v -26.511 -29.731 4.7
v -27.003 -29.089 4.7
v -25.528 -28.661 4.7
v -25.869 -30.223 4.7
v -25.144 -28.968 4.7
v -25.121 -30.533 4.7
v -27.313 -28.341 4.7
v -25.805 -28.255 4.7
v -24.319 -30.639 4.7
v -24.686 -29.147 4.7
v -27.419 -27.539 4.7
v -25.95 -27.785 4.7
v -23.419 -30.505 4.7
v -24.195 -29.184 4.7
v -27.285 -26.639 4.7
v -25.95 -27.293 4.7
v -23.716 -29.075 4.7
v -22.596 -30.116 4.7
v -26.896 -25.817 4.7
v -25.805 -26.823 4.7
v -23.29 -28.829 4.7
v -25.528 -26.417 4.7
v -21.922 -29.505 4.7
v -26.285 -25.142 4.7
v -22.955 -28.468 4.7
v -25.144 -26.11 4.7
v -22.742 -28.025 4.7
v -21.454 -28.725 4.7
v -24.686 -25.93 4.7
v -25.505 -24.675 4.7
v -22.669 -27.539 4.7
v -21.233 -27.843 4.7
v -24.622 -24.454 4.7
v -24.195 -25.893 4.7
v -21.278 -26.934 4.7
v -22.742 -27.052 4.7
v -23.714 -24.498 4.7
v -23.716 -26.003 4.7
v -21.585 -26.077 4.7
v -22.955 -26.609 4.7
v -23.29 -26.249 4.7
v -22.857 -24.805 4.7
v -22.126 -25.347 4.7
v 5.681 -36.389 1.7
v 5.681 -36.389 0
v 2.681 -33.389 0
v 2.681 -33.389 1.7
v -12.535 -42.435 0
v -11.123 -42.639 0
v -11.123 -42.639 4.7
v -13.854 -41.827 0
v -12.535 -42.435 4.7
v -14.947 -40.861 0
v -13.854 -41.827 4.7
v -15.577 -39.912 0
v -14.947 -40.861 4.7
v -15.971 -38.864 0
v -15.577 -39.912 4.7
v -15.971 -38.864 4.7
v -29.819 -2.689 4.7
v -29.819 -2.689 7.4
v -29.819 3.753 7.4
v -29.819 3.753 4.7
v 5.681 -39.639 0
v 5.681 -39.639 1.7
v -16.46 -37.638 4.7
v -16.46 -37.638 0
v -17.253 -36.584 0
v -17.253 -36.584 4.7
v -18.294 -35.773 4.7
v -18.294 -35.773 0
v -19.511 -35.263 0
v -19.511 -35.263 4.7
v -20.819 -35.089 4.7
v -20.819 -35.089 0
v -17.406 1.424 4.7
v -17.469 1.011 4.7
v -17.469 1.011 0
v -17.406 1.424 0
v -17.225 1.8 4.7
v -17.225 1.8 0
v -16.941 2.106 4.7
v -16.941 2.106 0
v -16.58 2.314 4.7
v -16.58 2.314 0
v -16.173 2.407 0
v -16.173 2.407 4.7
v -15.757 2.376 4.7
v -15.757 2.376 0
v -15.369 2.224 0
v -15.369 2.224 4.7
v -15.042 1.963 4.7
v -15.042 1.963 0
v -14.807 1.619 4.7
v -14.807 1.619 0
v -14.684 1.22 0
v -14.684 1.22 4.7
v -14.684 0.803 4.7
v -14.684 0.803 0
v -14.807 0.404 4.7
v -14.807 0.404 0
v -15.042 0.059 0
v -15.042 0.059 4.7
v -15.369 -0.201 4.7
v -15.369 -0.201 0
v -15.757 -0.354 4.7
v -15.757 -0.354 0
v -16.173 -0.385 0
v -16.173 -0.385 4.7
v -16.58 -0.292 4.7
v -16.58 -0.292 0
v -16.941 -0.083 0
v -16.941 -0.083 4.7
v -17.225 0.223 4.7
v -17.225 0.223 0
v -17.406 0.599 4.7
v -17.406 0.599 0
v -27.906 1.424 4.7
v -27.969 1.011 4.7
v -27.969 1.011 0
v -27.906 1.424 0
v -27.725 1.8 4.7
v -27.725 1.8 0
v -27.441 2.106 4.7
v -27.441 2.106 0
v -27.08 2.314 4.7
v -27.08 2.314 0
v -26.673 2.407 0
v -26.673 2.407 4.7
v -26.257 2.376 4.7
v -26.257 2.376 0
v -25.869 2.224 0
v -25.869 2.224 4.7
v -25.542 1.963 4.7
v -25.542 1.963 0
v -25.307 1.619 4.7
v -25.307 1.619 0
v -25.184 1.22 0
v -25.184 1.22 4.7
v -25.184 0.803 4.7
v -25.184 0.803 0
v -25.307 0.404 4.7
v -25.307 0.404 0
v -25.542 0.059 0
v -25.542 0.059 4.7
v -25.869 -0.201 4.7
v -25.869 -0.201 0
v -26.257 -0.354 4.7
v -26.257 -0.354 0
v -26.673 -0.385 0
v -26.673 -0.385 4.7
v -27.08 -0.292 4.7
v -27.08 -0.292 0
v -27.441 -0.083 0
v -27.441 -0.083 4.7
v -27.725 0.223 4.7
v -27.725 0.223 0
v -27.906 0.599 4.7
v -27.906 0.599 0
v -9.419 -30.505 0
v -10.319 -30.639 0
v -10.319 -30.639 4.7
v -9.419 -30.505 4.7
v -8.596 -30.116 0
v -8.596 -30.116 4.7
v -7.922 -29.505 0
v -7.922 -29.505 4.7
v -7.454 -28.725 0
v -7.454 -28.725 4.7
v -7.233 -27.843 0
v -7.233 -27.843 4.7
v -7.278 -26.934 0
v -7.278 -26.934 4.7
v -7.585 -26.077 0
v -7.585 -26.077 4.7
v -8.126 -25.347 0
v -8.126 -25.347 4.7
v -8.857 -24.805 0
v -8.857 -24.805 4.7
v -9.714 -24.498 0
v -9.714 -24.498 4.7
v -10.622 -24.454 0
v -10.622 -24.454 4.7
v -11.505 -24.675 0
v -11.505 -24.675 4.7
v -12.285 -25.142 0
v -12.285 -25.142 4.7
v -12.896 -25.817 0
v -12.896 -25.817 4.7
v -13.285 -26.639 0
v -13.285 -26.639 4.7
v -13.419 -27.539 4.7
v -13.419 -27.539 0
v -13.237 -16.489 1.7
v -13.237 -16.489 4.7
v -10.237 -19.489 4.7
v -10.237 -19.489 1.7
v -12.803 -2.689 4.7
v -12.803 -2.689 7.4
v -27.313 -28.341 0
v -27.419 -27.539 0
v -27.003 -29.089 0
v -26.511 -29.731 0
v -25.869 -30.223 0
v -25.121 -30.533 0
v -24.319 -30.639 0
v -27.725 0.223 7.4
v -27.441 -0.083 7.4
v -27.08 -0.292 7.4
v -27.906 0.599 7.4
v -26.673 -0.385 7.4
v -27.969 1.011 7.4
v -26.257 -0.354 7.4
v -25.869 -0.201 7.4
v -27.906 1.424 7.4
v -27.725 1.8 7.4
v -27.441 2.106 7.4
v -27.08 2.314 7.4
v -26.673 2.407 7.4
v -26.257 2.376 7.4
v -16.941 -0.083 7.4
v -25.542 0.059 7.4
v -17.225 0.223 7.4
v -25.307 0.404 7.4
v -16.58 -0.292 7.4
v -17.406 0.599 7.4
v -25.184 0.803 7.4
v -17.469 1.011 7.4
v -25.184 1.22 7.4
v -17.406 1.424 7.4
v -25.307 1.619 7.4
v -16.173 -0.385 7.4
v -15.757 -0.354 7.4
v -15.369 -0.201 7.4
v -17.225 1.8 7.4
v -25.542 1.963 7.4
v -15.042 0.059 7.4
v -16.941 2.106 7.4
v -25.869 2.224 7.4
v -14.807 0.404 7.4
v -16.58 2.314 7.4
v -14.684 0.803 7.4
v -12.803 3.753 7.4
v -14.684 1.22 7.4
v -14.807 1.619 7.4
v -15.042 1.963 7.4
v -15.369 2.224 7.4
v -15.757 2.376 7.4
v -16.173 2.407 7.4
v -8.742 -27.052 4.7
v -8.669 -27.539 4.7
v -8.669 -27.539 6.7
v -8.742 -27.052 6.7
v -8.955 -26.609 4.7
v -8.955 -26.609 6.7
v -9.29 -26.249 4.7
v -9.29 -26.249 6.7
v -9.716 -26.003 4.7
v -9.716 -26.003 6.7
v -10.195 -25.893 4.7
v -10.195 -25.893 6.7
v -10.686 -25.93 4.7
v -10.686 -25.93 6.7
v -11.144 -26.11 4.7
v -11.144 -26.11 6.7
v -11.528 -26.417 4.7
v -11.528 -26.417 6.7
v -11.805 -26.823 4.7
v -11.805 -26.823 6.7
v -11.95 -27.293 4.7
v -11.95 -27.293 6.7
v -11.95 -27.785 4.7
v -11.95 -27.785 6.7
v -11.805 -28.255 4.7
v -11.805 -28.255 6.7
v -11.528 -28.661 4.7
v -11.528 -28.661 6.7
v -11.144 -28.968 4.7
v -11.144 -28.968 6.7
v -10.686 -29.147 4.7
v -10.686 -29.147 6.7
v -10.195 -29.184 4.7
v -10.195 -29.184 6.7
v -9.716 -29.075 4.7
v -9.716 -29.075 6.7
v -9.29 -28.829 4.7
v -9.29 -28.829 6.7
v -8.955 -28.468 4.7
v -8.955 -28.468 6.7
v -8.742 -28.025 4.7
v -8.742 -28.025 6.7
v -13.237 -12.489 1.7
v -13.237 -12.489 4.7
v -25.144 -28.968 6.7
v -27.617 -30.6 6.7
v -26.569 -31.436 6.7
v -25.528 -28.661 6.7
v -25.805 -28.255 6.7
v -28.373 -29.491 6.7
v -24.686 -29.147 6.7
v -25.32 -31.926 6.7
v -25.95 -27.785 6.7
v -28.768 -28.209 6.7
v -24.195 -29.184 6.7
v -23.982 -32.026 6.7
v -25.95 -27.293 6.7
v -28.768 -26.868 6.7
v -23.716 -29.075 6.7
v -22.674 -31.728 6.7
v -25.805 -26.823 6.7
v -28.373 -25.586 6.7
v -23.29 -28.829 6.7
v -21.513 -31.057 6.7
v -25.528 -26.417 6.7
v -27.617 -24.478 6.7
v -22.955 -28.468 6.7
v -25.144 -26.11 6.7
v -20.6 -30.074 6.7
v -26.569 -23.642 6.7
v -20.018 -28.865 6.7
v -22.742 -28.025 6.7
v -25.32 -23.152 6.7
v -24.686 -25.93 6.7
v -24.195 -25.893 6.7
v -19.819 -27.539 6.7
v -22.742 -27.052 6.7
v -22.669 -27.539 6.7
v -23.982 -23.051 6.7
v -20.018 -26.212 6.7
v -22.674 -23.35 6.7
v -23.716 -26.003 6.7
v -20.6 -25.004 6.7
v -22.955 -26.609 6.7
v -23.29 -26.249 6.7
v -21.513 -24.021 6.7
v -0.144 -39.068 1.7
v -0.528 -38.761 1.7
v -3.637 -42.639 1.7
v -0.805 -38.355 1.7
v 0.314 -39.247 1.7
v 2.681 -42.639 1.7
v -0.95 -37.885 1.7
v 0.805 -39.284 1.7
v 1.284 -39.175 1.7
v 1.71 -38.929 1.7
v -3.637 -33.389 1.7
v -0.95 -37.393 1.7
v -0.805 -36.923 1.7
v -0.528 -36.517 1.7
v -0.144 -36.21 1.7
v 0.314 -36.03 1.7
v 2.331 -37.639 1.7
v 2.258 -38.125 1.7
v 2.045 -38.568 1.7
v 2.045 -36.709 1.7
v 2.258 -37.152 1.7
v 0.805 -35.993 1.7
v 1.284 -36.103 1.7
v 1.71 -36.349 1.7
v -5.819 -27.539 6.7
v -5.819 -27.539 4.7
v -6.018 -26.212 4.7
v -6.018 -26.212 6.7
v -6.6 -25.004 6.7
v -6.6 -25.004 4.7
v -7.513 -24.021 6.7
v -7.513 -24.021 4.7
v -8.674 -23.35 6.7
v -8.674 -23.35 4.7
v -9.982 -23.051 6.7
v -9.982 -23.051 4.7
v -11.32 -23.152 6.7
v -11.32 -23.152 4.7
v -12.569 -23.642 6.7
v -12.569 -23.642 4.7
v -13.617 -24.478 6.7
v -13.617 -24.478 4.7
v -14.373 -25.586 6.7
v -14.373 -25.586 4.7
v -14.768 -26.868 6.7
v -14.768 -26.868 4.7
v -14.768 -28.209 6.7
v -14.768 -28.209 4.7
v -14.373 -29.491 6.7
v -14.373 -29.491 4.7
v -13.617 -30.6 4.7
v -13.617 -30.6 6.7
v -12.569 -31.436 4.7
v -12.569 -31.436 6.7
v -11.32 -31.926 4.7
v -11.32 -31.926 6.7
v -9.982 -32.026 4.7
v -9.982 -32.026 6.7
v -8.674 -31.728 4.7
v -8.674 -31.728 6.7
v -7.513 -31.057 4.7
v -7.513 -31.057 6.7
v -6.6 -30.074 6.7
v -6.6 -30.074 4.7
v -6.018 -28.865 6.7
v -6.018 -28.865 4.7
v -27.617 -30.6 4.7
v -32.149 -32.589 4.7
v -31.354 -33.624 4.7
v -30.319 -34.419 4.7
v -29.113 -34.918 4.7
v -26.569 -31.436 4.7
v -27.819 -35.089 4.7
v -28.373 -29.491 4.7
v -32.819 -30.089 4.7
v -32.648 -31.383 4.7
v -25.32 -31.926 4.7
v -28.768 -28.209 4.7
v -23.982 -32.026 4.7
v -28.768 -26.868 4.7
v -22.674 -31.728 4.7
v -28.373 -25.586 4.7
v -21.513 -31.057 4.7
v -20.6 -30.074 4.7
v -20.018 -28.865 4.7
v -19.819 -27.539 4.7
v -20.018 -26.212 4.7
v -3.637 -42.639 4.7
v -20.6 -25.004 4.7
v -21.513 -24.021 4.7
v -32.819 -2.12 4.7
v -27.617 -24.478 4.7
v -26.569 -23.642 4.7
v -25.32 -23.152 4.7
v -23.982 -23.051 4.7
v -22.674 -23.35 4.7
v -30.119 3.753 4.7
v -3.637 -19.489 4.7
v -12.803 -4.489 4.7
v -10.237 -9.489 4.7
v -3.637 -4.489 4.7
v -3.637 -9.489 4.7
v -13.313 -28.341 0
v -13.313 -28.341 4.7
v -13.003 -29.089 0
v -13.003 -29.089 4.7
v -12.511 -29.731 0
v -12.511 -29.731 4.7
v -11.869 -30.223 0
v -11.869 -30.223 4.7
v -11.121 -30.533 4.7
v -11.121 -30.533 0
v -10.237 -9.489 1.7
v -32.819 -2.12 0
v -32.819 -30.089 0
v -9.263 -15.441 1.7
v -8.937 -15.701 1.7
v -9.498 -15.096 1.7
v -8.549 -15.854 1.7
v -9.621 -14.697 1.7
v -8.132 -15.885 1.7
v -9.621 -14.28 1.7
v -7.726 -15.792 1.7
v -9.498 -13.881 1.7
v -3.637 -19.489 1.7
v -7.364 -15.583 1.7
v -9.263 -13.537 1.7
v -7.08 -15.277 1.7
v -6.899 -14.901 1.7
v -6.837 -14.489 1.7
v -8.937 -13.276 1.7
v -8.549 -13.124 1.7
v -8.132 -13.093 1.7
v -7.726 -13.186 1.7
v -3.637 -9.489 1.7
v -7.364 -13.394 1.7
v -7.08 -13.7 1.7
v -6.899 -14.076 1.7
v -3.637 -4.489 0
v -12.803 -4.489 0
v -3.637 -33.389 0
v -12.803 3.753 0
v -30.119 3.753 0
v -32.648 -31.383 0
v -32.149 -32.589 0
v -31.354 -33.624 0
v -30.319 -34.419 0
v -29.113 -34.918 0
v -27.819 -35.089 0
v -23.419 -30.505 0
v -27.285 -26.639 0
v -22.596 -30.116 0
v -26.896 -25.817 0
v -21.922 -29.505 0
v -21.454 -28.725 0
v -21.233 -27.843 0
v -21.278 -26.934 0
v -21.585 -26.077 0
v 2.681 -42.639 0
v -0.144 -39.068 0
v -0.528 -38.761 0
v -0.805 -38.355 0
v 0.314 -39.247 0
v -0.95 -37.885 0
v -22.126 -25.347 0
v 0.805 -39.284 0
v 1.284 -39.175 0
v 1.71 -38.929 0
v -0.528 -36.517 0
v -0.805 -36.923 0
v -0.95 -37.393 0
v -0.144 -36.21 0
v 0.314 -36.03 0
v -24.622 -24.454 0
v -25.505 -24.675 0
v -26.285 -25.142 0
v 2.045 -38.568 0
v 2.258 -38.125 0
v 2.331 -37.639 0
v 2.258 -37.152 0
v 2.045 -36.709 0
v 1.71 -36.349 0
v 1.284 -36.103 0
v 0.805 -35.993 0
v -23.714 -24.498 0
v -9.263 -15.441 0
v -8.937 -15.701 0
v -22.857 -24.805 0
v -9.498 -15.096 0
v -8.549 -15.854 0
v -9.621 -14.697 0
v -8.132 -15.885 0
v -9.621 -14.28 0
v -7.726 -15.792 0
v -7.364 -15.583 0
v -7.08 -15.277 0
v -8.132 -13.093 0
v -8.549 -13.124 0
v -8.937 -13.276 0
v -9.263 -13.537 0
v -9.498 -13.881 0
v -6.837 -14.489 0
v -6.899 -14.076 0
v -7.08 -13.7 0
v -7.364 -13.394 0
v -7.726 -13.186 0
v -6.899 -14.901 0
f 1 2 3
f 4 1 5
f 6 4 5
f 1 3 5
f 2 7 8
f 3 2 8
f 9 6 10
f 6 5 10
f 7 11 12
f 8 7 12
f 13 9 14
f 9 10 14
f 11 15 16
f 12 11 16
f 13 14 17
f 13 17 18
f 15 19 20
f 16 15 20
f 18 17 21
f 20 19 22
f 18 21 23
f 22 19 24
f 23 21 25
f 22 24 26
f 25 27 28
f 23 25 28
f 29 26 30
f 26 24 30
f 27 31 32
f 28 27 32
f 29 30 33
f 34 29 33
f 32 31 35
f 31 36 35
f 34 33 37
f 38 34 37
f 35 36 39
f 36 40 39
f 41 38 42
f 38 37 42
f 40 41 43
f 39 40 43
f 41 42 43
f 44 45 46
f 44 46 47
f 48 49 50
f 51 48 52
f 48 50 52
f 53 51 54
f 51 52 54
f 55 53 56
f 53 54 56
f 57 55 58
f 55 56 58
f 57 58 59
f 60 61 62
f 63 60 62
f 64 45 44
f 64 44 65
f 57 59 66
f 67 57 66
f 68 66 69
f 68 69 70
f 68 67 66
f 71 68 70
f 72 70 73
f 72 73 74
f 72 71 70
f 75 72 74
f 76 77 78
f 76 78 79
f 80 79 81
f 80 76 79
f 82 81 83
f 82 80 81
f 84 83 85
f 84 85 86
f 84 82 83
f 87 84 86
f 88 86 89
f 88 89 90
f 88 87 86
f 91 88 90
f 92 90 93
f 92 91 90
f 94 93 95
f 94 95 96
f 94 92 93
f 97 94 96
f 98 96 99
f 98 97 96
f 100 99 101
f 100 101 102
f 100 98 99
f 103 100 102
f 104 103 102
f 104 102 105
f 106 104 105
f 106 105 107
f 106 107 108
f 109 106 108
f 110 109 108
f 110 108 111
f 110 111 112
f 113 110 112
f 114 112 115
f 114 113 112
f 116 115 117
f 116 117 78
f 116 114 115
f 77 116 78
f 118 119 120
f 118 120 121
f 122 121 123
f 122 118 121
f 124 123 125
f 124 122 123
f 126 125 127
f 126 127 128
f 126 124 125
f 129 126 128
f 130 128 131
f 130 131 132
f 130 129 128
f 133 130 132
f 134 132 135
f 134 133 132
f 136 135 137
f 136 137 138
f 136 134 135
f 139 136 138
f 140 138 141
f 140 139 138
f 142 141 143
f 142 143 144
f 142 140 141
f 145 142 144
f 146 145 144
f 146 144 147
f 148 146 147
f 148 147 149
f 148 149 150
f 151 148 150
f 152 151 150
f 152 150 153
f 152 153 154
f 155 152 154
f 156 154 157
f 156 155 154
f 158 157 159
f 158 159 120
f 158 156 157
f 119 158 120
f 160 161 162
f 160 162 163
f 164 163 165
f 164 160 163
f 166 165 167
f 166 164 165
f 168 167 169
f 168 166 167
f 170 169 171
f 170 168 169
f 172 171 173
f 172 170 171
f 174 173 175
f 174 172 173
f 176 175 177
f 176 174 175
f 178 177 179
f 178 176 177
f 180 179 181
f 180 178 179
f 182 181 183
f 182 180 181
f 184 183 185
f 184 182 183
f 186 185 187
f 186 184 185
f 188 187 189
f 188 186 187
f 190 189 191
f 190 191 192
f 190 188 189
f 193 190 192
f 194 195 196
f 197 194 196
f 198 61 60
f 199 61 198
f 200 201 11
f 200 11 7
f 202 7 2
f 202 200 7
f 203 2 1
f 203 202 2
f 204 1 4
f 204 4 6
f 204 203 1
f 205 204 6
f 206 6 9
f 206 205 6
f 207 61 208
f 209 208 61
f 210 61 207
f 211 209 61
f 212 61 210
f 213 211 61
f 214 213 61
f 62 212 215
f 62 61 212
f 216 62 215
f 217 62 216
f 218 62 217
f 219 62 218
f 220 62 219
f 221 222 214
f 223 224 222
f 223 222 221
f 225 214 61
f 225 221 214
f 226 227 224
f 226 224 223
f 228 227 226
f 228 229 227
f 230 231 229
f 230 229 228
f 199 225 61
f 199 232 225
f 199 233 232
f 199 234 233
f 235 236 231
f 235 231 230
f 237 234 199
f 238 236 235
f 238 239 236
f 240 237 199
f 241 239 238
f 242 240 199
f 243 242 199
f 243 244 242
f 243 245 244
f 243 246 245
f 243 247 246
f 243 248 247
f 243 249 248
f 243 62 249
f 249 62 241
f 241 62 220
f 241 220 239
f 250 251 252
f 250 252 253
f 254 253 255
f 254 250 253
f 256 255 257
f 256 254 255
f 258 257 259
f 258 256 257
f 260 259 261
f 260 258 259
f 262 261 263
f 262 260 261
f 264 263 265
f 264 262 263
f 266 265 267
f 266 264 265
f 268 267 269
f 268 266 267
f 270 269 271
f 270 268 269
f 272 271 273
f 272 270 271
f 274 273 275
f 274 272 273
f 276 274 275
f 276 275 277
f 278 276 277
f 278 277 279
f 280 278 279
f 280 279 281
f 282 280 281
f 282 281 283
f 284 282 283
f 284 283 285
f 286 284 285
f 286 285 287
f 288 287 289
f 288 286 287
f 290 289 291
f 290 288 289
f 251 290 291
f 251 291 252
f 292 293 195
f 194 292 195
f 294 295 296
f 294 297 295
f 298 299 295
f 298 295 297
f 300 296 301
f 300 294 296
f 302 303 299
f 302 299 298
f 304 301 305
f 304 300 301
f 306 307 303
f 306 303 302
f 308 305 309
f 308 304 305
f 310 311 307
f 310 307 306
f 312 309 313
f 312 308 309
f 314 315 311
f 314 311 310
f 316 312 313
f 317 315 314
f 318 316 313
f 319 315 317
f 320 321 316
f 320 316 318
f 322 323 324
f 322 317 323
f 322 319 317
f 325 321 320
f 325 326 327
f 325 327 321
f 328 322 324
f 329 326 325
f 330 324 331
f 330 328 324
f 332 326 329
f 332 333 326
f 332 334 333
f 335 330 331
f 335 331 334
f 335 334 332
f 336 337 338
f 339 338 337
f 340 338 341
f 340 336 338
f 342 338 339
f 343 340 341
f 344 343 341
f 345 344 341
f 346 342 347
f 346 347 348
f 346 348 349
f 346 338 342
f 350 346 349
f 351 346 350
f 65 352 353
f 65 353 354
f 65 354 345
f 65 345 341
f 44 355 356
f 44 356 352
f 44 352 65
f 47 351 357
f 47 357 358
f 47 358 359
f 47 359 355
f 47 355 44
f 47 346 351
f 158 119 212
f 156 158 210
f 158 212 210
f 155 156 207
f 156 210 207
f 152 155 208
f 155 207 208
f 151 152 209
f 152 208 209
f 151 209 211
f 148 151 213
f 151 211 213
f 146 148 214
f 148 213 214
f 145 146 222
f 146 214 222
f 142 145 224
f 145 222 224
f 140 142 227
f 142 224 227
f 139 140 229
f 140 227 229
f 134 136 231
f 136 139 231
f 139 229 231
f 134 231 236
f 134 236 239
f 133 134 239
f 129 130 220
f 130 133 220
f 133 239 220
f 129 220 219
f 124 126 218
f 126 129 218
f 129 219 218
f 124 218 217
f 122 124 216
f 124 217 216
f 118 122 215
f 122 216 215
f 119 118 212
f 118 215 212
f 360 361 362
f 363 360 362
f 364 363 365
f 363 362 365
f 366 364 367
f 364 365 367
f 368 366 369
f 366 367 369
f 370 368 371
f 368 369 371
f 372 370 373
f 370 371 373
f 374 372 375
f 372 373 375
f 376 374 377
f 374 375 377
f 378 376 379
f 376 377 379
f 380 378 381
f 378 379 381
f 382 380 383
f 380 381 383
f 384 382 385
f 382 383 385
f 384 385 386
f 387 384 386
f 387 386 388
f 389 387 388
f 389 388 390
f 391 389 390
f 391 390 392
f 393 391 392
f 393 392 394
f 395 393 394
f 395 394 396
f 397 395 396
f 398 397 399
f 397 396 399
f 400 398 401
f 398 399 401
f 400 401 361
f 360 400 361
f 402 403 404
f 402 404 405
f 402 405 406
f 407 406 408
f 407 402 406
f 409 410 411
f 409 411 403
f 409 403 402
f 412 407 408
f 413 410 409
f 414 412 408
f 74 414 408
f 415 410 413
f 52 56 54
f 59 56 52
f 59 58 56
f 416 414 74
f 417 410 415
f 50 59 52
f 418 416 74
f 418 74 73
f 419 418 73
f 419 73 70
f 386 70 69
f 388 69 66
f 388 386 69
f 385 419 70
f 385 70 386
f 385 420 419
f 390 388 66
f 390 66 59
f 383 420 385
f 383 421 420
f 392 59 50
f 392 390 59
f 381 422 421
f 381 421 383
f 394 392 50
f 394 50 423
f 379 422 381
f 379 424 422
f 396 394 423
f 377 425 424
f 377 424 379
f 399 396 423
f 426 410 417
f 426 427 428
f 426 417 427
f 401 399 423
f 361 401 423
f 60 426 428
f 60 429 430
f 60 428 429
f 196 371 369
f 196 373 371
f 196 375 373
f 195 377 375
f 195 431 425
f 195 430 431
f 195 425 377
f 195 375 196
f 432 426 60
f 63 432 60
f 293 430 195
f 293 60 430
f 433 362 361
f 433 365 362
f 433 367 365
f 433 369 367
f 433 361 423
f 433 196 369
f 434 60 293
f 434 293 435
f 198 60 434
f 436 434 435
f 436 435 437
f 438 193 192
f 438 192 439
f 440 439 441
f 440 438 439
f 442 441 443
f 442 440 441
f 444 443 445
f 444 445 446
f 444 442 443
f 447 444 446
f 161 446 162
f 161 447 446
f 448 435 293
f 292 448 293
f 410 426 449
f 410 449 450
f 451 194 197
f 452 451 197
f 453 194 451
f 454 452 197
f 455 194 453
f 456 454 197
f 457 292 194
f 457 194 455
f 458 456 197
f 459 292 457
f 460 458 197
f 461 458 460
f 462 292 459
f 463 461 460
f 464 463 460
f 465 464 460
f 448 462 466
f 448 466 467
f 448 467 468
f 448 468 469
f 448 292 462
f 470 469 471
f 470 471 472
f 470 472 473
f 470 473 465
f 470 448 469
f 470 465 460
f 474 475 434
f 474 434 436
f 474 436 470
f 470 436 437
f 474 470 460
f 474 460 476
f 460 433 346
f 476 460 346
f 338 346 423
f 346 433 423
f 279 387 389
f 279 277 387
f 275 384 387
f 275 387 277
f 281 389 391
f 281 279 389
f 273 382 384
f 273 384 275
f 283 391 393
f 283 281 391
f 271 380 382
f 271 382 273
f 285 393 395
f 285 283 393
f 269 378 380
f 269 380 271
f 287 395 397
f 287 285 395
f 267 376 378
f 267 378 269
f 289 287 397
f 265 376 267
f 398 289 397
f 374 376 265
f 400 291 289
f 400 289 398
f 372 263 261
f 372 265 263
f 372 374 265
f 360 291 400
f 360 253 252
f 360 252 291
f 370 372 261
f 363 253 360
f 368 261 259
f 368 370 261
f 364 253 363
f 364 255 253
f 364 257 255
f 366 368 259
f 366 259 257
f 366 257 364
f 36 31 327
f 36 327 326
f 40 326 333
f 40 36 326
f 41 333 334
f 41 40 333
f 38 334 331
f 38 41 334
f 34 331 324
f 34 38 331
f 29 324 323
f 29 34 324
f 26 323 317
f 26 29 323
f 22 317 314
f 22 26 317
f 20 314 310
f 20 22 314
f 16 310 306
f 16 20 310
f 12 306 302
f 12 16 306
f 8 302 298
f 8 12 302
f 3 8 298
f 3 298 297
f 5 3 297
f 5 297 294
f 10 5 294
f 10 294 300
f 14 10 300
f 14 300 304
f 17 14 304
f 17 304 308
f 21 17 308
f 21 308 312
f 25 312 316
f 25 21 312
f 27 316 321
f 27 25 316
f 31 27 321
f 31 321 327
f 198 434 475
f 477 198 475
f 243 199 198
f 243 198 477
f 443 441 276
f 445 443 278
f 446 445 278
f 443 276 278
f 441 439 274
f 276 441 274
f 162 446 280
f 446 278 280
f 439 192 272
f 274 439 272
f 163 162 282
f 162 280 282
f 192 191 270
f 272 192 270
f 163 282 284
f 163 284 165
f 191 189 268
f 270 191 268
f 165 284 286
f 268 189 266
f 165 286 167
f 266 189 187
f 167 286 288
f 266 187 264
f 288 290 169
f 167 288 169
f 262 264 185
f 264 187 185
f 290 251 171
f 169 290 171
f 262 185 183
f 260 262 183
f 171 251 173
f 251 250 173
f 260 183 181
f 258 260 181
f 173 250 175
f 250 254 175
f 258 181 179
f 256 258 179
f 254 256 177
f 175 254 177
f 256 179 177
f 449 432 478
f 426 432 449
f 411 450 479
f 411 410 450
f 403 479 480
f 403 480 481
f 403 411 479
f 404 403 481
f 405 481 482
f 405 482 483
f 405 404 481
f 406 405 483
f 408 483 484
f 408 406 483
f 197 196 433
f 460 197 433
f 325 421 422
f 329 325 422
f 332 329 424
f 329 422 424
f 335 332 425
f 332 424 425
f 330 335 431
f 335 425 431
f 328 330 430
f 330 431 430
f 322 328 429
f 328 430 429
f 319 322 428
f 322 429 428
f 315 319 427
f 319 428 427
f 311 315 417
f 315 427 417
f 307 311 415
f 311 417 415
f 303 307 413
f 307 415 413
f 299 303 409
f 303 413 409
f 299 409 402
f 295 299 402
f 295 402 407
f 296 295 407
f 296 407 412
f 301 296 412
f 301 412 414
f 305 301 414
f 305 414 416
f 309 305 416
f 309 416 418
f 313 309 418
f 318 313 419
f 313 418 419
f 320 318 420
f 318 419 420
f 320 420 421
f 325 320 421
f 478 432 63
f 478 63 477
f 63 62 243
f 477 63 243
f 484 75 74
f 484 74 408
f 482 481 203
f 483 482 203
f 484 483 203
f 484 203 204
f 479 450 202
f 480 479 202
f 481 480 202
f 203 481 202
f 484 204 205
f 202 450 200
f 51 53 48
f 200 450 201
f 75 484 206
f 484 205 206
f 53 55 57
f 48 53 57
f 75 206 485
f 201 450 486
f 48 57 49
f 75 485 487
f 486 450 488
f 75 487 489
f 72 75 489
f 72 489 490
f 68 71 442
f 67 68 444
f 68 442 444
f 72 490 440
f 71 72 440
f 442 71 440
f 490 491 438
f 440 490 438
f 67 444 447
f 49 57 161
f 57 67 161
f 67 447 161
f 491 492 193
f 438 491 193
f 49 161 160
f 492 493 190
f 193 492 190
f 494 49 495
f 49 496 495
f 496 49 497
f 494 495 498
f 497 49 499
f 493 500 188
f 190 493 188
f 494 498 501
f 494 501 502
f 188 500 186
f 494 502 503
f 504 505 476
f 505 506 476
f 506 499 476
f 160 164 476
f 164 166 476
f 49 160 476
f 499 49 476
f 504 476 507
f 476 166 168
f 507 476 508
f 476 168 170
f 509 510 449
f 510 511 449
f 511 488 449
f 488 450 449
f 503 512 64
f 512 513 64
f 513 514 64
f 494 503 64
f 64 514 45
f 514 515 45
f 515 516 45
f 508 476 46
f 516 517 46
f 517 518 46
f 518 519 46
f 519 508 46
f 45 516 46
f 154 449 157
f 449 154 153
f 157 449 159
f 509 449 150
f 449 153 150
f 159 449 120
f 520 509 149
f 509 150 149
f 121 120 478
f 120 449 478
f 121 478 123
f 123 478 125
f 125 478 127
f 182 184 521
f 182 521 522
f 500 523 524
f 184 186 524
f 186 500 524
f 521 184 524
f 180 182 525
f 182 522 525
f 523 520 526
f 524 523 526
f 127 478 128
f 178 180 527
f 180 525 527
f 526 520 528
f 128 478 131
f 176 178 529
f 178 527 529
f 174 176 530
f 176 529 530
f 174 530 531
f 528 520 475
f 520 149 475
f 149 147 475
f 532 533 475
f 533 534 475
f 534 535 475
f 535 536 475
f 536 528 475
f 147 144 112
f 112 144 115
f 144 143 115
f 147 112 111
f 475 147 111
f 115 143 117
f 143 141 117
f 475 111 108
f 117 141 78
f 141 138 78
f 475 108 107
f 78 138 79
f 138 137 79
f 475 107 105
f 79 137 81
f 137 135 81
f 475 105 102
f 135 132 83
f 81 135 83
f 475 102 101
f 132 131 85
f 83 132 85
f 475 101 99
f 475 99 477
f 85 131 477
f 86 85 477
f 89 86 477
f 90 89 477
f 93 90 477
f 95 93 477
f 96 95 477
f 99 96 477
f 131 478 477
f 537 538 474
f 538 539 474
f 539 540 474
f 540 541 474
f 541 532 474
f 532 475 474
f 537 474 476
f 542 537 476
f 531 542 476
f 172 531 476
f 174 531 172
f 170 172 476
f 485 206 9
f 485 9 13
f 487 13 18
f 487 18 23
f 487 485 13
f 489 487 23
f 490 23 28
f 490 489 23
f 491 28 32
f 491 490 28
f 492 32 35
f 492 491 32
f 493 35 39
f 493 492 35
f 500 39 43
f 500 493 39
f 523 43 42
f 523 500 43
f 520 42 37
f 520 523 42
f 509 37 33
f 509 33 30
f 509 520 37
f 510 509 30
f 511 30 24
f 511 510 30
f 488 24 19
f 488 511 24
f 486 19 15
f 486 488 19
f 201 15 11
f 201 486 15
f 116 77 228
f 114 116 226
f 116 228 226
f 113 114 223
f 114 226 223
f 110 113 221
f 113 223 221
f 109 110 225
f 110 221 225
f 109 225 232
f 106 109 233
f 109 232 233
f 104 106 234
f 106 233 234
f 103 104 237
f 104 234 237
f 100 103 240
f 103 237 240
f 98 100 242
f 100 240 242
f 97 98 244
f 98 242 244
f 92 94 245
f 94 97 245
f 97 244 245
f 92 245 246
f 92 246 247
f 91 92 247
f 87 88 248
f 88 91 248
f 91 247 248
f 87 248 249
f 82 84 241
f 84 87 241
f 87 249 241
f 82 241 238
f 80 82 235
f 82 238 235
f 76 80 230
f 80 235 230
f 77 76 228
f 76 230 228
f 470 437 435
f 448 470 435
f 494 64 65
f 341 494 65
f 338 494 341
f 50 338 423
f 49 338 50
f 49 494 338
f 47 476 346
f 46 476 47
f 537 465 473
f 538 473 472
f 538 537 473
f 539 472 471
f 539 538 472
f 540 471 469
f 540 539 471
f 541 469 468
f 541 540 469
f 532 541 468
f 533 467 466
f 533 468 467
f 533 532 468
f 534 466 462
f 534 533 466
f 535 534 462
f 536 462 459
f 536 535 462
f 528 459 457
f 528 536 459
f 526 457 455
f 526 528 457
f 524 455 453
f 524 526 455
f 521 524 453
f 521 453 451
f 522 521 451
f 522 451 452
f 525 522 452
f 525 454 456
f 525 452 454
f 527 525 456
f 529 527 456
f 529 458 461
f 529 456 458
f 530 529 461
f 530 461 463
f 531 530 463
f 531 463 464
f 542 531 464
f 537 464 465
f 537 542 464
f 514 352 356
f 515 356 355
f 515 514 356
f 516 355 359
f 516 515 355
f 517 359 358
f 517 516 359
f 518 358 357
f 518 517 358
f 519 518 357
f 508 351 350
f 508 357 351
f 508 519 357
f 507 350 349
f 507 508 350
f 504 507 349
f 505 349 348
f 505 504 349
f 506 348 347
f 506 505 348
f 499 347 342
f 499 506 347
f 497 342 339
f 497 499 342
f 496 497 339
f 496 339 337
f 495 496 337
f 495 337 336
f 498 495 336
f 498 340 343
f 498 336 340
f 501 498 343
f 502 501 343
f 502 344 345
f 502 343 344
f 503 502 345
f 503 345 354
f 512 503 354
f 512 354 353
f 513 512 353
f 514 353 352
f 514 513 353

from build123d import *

# Parameters (mm, degrees)
SKETCH2_R           = 1.4
SKETCH2_R_2         = 1.65
BOSS_EXTRUDE1_DEPTH = 4.7
SKETCH3_R           = 4.5
SKETCH3_R_2         = 1.65
BOSS_EXTRUDE2_DEPTH = 2
FILLET1_R           = 5
CHAMFER1_SIZE       = 3
CUT_EXTRUDE1_DEPTH  = 3
BOSS_EXTRUDE3_START = -4.7
SKETCH5_R           = 1.4
BOSS_EXTRUDE3_DEPTH = 4.7
BOSS_EXTRUDE4_START = 2.7
SKETCH6_W           = 17.015251106
SKETCH6_H           = 6.441411174
SKETCH6_R           = 1.4
BOSS_EXTRUDE4_DEPTH = 2.7


with BuildPart() as part:
    # Sketch2 → Boss-Extrude1 (new body)
    with BuildSketch(Plane.XY):
        with BuildLine():
            Line((5.681498191, -33.388801204), (5.681498191, -42.638801204))
            Line((5.681498191, -42.638801204), (-15.818501809, -42.638801204))
            Line((-15.818501809, -42.638801204), (-15.818501809, -40.088801204))
            ThreePointArc((-15.818501809, -40.088801204), (-17.282967903, -36.553267298), (-20.818501809, -35.088801204))
            Line((-20.818501809, -35.088801204), (-32.818501809, -35.088801204))
            Line((-32.818501809, -35.088801204), (-32.818501809, -4.488801204))
            Line((-32.818501809, -4.488801204), (-12.818501809, -4.488801204))
            Line((-12.818501809, -4.488801204), (-3.637114605, -4.488801204))
            Line((-3.637114605, -4.488801204), (-3.637114605, -4.888801204))
            Line((-3.637114605, -4.888801204), (-3.637114605, -9.488801204))
            Line((-3.637114605, -9.488801204), (-3.637114605, -33.388801204))
            Line((-3.637114605, -33.388801204), (5.681498191, -33.388801204))
        make_face()
        with Locations((-8.237114605, -14.488801204)):
            Circle(SKETCH2_R, mode=Mode.SUBTRACT)
        with Locations((0.681498191, -37.638801204)):
            Circle(SKETCH2_R_2, mode=Mode.SUBTRACT)
        with BuildLine():
            ThreePointArc((-27.418501809, -27.538801204), (-26.510532831, -29.730832226), (-24.318501809, -30.638801204))
            ThreePointArc((-24.318501809, -30.638801204), (-22.126470787, -25.346770182), (-27.418501809, -27.538801204))
        make_face(mode=Mode.SUBTRACT)
        with BuildLine():
            ThreePointArc((-13.418501809, -27.538801204), (-12.510532831, -29.730832226), (-10.318501809, -30.638801204))
            ThreePointArc((-10.318501809, -30.638801204), (-8.126470787, -25.346770182), (-13.418501809, -27.538801204))
        make_face(mode=Mode.SUBTRACT)
    extrude(amount=BOSS_EXTRUDE1_DEPTH)

    # Sketch3 → Boss-Extrude2 (add)
    # profile 1 of 2: a face of its own
    with BuildSketch(Plane.XY.offset(4.7)):
        with Locations((-24.318501809, -27.538801204)):
            Circle(SKETCH3_R)
        with Locations((-24.318501809, -27.538801204)):
            Circle(SKETCH3_R_2, mode=Mode.SUBTRACT)
    # profile 2 of 2: a face of its own
    with BuildSketch(Plane.XY.offset(4.7)):
        with Locations((-10.318501809, -27.538801204)):
            Circle(SKETCH3_R)
        with Locations((-10.318501809, -27.538801204)):
            Circle(SKETCH3_R_2, mode=Mode.SUBTRACT)
    extrude(amount=BOSS_EXTRUDE2_DEPTH)

    # Fillet1
    fillet1_edges = [part.edges().sort_by_distance(p)[0] for p in [
        (-15.818501809, -42.638801204, 2.35),
        (-32.818501809, -35.088801204, 2.35),
        (-32.818501809, -4.488801204, 2.35),
    ]]
    fillet(fillet1_edges, radius=FILLET1_R)

    # Chamfer1
    chamfer1_edges = [part.edges().sort_by_distance(p)[0] for p in [
        (5.681498191, -33.388801204, 2.35),
        (5.681498191, -42.638801204, 2.35),
    ]]
    chamfer(chamfer1_edges, length=CHAMFER1_SIZE)

    # Sketch4 → Cut-Extrude1 (cut)
    with BuildSketch(Plane.XY.offset(4.7)):
        Polygon((-3.637114605, -42.638801204), (2.681498191, -42.638801204), (5.681498191, -39.638801204), (5.681498191, -36.388801204), (2.681498191, -33.388801204), (-3.637114605, -33.388801204), align=None)
        Polygon((-3.637114605, -9.488801204), (-10.237114605, -9.488801204), (-13.237114605, -12.488801204), (-13.237114605, -16.488801204), (-10.237114605, -19.488801204), (-3.637114605, -19.488801204), align=None)
    extrude(amount=-CUT_EXTRUDE1_DEPTH, mode=Mode.SUBTRACT)

    # Sketch5 → Boss-Extrude3 (add)
    with BuildSketch(Plane(origin=(0, 0, 0), x_dir=(-1, 0, 0), z_dir=(0, 0, -1)).offset(BOSS_EXTRUDE3_START)):
        with BuildLine():
            Line((12.803250703, -4.488801204), (12.803250703, 3.75260997))
            Line((12.803250703, 3.75260997), (30.118597337, 3.75260997))
            Line((30.118597337, 3.75260997), (32.818501809, -2.119551062))
            Line((32.818501809, -2.119551062), (32.818501809, -9.488801204))
            ThreePointArc((32.818501809, -9.488801204), (31.354035715, -5.953267298), (27.818501809, -4.488801204))
            Line((27.818501809, -4.488801204), (12.803250703, -4.488801204))
        make_face()
        with Locations((26.568501809, 1.011198796)):
            Circle(SKETCH5_R, mode=Mode.SUBTRACT)
        with Locations((16.068501809, 1.011198796)):
            Circle(SKETCH5_R, mode=Mode.SUBTRACT)
    extrude(amount=BOSS_EXTRUDE3_DEPTH)

    # Sketch6 → Boss-Extrude4 (add)
    with BuildSketch(Plane.XY.offset(4.7).offset(BOSS_EXTRUDE4_START)):
        with Locations((-21.310876256, 0.531904383)):
            Rectangle(SKETCH6_W, SKETCH6_H)
        with Locations(Location((-26.568501809, 1.011198796, 0), (0, 0, 180))):
            Circle(SKETCH6_R, mode=Mode.SUBTRACT)
        with Locations(Location((-16.068501809, 1.011198796, 0), (0, 0, 180))):
            Circle(SKETCH6_R, mode=Mode.SUBTRACT)
    extrude(amount=-BOSS_EXTRUDE4_DEPTH)


solid = part.part
